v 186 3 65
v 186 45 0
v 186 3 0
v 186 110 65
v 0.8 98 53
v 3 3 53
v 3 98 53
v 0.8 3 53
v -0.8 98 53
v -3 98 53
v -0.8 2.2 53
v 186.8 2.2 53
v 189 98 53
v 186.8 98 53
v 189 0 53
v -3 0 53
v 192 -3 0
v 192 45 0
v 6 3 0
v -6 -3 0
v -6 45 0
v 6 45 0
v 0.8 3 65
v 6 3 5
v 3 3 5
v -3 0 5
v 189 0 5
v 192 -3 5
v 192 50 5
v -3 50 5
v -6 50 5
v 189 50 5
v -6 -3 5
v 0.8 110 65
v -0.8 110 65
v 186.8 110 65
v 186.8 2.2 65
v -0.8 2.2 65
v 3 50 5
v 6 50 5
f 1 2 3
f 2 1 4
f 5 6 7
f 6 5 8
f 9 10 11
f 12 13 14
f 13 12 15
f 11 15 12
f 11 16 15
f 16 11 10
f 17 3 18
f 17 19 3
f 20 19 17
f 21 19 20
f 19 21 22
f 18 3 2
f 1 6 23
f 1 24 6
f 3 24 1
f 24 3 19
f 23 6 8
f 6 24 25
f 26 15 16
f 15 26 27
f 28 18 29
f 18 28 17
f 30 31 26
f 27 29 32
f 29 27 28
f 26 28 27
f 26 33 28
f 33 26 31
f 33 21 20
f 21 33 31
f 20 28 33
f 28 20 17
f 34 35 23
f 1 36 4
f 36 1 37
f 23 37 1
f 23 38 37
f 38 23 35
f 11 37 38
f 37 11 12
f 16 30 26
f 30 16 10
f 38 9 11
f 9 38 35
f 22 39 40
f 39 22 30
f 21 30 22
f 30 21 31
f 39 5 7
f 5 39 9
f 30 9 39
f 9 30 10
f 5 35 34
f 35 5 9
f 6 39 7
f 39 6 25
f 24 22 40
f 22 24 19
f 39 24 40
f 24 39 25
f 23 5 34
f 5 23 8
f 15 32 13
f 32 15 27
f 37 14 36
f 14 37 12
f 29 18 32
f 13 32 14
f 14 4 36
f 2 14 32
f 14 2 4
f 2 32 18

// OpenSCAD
INSERTION_LENGTH = 12;
INSERTION_WALL_THICKNESS = 0.8;

WIDTH = 186;
LENGTH = 65;

SIDE_LENGTH = 110;
SIDE_END_WIDTH = 23;

ADD_BEZEL = true;
BEZEL_THICKNESS = 3;
BEZEL_DEPTH = 5;

WALL_THICKNESS = 3;

module prism(l, w, h) {
  polyhedron(
      points = [ [ 0, 0, 0 ], [ l, 0, 0 ], [ l, w, 0 ], [ 0, w, 0 ], [ 0, w, h ], [ l, w, h ] ],
      faces = [ [ 0, 1, 2, 3 ], [ 5, 4, 3, 2 ], [ 0, 4, 5, 1 ], [ 0, 3, 4 ], [ 5, 2, 1 ] ]);
}

module sideFlap(isLeftSide = false, isRightSide = false) {
  difference() {
    union() {
      cube(size = [ WALL_THICKNESS, SIDE_LENGTH, LENGTH - INSERTION_LENGTH ]);
      if (ADD_BEZEL) {
        if (isLeftSide) {
          translate(v = [ -BEZEL_THICKNESS, 0, 0 ]) {
            cube(size = [ BEZEL_THICKNESS, SIDE_LENGTH, BEZEL_DEPTH ]);
          }
        }
        if (isRightSide) {
          translate(v = [ WALL_THICKNESS, 0, 0 ]) {
            cube(size = [ BEZEL_THICKNESS, SIDE_LENGTH, BEZEL_DEPTH ]);
          }
        }
      }
      if (isLeftSide) {
        translate(v = [
          WALL_THICKNESS - INSERTION_WALL_THICKNESS, WALL_THICKNESS - INSERTION_WALL_THICKNESS, LENGTH -
          INSERTION_LENGTH
        ]) {
          cube(size = [
            INSERTION_WALL_THICKNESS, SIDE_LENGTH - WALL_THICKNESS + INSERTION_WALL_THICKNESS,
            INSERTION_LENGTH
          ]);
        }
      }
      if (isRightSide) {
        translate(v = [ 0, WALL_THICKNESS - INSERTION_WALL_THICKNESS, LENGTH - INSERTION_LENGTH ]) {
          cube(size = [
            INSERTION_WALL_THICKNESS, SIDE_LENGTH - WALL_THICKNESS + INSERTION_WALL_THICKNESS,
            INSERTION_LENGTH
          ]);
        }
      }
    }
    translate(v = [ -WALL_THICKNESS, SIDE_LENGTH - LENGTH, 0 ]) {
      prism(l = BEZEL_DEPTH + BEZEL_DEPTH, w = LENGTH, h = LENGTH);
    }
  }
}

// Long Side
union() {
  cube(size = [ WIDTH, WALL_THICKNESS, LENGTH - INSERTION_LENGTH ]);
  if (ADD_BEZEL) {
    translate(v = [ -BEZEL_THICKNESS - WALL_THICKNESS, -BEZEL_THICKNESS, 0 ]) {
      cube(size = [ WIDTH + (WALL_THICKNESS + BEZEL_THICKNESS) * 2, BEZEL_THICKNESS, BEZEL_DEPTH ]);
    }
  }
  translate(v = [ 0, WALL_THICKNESS - INSERTION_WALL_THICKNESS, LENGTH - INSERTION_LENGTH ]) {
    cube(size = [ WIDTH, INSERTION_WALL_THICKNESS, INSERTION_LENGTH ]);
  }
}

// Left Side
translate(v = [ -WALL_THICKNESS, 0, 0 ]) {
  sideFlap(isLeftSide = true);
}

// Right Side
translate(v = [ WIDTH, 0, 0 ]) {
  sideFlap(isRightSide = true);
}
{
  sideFlap(isRightSide = true);
}
